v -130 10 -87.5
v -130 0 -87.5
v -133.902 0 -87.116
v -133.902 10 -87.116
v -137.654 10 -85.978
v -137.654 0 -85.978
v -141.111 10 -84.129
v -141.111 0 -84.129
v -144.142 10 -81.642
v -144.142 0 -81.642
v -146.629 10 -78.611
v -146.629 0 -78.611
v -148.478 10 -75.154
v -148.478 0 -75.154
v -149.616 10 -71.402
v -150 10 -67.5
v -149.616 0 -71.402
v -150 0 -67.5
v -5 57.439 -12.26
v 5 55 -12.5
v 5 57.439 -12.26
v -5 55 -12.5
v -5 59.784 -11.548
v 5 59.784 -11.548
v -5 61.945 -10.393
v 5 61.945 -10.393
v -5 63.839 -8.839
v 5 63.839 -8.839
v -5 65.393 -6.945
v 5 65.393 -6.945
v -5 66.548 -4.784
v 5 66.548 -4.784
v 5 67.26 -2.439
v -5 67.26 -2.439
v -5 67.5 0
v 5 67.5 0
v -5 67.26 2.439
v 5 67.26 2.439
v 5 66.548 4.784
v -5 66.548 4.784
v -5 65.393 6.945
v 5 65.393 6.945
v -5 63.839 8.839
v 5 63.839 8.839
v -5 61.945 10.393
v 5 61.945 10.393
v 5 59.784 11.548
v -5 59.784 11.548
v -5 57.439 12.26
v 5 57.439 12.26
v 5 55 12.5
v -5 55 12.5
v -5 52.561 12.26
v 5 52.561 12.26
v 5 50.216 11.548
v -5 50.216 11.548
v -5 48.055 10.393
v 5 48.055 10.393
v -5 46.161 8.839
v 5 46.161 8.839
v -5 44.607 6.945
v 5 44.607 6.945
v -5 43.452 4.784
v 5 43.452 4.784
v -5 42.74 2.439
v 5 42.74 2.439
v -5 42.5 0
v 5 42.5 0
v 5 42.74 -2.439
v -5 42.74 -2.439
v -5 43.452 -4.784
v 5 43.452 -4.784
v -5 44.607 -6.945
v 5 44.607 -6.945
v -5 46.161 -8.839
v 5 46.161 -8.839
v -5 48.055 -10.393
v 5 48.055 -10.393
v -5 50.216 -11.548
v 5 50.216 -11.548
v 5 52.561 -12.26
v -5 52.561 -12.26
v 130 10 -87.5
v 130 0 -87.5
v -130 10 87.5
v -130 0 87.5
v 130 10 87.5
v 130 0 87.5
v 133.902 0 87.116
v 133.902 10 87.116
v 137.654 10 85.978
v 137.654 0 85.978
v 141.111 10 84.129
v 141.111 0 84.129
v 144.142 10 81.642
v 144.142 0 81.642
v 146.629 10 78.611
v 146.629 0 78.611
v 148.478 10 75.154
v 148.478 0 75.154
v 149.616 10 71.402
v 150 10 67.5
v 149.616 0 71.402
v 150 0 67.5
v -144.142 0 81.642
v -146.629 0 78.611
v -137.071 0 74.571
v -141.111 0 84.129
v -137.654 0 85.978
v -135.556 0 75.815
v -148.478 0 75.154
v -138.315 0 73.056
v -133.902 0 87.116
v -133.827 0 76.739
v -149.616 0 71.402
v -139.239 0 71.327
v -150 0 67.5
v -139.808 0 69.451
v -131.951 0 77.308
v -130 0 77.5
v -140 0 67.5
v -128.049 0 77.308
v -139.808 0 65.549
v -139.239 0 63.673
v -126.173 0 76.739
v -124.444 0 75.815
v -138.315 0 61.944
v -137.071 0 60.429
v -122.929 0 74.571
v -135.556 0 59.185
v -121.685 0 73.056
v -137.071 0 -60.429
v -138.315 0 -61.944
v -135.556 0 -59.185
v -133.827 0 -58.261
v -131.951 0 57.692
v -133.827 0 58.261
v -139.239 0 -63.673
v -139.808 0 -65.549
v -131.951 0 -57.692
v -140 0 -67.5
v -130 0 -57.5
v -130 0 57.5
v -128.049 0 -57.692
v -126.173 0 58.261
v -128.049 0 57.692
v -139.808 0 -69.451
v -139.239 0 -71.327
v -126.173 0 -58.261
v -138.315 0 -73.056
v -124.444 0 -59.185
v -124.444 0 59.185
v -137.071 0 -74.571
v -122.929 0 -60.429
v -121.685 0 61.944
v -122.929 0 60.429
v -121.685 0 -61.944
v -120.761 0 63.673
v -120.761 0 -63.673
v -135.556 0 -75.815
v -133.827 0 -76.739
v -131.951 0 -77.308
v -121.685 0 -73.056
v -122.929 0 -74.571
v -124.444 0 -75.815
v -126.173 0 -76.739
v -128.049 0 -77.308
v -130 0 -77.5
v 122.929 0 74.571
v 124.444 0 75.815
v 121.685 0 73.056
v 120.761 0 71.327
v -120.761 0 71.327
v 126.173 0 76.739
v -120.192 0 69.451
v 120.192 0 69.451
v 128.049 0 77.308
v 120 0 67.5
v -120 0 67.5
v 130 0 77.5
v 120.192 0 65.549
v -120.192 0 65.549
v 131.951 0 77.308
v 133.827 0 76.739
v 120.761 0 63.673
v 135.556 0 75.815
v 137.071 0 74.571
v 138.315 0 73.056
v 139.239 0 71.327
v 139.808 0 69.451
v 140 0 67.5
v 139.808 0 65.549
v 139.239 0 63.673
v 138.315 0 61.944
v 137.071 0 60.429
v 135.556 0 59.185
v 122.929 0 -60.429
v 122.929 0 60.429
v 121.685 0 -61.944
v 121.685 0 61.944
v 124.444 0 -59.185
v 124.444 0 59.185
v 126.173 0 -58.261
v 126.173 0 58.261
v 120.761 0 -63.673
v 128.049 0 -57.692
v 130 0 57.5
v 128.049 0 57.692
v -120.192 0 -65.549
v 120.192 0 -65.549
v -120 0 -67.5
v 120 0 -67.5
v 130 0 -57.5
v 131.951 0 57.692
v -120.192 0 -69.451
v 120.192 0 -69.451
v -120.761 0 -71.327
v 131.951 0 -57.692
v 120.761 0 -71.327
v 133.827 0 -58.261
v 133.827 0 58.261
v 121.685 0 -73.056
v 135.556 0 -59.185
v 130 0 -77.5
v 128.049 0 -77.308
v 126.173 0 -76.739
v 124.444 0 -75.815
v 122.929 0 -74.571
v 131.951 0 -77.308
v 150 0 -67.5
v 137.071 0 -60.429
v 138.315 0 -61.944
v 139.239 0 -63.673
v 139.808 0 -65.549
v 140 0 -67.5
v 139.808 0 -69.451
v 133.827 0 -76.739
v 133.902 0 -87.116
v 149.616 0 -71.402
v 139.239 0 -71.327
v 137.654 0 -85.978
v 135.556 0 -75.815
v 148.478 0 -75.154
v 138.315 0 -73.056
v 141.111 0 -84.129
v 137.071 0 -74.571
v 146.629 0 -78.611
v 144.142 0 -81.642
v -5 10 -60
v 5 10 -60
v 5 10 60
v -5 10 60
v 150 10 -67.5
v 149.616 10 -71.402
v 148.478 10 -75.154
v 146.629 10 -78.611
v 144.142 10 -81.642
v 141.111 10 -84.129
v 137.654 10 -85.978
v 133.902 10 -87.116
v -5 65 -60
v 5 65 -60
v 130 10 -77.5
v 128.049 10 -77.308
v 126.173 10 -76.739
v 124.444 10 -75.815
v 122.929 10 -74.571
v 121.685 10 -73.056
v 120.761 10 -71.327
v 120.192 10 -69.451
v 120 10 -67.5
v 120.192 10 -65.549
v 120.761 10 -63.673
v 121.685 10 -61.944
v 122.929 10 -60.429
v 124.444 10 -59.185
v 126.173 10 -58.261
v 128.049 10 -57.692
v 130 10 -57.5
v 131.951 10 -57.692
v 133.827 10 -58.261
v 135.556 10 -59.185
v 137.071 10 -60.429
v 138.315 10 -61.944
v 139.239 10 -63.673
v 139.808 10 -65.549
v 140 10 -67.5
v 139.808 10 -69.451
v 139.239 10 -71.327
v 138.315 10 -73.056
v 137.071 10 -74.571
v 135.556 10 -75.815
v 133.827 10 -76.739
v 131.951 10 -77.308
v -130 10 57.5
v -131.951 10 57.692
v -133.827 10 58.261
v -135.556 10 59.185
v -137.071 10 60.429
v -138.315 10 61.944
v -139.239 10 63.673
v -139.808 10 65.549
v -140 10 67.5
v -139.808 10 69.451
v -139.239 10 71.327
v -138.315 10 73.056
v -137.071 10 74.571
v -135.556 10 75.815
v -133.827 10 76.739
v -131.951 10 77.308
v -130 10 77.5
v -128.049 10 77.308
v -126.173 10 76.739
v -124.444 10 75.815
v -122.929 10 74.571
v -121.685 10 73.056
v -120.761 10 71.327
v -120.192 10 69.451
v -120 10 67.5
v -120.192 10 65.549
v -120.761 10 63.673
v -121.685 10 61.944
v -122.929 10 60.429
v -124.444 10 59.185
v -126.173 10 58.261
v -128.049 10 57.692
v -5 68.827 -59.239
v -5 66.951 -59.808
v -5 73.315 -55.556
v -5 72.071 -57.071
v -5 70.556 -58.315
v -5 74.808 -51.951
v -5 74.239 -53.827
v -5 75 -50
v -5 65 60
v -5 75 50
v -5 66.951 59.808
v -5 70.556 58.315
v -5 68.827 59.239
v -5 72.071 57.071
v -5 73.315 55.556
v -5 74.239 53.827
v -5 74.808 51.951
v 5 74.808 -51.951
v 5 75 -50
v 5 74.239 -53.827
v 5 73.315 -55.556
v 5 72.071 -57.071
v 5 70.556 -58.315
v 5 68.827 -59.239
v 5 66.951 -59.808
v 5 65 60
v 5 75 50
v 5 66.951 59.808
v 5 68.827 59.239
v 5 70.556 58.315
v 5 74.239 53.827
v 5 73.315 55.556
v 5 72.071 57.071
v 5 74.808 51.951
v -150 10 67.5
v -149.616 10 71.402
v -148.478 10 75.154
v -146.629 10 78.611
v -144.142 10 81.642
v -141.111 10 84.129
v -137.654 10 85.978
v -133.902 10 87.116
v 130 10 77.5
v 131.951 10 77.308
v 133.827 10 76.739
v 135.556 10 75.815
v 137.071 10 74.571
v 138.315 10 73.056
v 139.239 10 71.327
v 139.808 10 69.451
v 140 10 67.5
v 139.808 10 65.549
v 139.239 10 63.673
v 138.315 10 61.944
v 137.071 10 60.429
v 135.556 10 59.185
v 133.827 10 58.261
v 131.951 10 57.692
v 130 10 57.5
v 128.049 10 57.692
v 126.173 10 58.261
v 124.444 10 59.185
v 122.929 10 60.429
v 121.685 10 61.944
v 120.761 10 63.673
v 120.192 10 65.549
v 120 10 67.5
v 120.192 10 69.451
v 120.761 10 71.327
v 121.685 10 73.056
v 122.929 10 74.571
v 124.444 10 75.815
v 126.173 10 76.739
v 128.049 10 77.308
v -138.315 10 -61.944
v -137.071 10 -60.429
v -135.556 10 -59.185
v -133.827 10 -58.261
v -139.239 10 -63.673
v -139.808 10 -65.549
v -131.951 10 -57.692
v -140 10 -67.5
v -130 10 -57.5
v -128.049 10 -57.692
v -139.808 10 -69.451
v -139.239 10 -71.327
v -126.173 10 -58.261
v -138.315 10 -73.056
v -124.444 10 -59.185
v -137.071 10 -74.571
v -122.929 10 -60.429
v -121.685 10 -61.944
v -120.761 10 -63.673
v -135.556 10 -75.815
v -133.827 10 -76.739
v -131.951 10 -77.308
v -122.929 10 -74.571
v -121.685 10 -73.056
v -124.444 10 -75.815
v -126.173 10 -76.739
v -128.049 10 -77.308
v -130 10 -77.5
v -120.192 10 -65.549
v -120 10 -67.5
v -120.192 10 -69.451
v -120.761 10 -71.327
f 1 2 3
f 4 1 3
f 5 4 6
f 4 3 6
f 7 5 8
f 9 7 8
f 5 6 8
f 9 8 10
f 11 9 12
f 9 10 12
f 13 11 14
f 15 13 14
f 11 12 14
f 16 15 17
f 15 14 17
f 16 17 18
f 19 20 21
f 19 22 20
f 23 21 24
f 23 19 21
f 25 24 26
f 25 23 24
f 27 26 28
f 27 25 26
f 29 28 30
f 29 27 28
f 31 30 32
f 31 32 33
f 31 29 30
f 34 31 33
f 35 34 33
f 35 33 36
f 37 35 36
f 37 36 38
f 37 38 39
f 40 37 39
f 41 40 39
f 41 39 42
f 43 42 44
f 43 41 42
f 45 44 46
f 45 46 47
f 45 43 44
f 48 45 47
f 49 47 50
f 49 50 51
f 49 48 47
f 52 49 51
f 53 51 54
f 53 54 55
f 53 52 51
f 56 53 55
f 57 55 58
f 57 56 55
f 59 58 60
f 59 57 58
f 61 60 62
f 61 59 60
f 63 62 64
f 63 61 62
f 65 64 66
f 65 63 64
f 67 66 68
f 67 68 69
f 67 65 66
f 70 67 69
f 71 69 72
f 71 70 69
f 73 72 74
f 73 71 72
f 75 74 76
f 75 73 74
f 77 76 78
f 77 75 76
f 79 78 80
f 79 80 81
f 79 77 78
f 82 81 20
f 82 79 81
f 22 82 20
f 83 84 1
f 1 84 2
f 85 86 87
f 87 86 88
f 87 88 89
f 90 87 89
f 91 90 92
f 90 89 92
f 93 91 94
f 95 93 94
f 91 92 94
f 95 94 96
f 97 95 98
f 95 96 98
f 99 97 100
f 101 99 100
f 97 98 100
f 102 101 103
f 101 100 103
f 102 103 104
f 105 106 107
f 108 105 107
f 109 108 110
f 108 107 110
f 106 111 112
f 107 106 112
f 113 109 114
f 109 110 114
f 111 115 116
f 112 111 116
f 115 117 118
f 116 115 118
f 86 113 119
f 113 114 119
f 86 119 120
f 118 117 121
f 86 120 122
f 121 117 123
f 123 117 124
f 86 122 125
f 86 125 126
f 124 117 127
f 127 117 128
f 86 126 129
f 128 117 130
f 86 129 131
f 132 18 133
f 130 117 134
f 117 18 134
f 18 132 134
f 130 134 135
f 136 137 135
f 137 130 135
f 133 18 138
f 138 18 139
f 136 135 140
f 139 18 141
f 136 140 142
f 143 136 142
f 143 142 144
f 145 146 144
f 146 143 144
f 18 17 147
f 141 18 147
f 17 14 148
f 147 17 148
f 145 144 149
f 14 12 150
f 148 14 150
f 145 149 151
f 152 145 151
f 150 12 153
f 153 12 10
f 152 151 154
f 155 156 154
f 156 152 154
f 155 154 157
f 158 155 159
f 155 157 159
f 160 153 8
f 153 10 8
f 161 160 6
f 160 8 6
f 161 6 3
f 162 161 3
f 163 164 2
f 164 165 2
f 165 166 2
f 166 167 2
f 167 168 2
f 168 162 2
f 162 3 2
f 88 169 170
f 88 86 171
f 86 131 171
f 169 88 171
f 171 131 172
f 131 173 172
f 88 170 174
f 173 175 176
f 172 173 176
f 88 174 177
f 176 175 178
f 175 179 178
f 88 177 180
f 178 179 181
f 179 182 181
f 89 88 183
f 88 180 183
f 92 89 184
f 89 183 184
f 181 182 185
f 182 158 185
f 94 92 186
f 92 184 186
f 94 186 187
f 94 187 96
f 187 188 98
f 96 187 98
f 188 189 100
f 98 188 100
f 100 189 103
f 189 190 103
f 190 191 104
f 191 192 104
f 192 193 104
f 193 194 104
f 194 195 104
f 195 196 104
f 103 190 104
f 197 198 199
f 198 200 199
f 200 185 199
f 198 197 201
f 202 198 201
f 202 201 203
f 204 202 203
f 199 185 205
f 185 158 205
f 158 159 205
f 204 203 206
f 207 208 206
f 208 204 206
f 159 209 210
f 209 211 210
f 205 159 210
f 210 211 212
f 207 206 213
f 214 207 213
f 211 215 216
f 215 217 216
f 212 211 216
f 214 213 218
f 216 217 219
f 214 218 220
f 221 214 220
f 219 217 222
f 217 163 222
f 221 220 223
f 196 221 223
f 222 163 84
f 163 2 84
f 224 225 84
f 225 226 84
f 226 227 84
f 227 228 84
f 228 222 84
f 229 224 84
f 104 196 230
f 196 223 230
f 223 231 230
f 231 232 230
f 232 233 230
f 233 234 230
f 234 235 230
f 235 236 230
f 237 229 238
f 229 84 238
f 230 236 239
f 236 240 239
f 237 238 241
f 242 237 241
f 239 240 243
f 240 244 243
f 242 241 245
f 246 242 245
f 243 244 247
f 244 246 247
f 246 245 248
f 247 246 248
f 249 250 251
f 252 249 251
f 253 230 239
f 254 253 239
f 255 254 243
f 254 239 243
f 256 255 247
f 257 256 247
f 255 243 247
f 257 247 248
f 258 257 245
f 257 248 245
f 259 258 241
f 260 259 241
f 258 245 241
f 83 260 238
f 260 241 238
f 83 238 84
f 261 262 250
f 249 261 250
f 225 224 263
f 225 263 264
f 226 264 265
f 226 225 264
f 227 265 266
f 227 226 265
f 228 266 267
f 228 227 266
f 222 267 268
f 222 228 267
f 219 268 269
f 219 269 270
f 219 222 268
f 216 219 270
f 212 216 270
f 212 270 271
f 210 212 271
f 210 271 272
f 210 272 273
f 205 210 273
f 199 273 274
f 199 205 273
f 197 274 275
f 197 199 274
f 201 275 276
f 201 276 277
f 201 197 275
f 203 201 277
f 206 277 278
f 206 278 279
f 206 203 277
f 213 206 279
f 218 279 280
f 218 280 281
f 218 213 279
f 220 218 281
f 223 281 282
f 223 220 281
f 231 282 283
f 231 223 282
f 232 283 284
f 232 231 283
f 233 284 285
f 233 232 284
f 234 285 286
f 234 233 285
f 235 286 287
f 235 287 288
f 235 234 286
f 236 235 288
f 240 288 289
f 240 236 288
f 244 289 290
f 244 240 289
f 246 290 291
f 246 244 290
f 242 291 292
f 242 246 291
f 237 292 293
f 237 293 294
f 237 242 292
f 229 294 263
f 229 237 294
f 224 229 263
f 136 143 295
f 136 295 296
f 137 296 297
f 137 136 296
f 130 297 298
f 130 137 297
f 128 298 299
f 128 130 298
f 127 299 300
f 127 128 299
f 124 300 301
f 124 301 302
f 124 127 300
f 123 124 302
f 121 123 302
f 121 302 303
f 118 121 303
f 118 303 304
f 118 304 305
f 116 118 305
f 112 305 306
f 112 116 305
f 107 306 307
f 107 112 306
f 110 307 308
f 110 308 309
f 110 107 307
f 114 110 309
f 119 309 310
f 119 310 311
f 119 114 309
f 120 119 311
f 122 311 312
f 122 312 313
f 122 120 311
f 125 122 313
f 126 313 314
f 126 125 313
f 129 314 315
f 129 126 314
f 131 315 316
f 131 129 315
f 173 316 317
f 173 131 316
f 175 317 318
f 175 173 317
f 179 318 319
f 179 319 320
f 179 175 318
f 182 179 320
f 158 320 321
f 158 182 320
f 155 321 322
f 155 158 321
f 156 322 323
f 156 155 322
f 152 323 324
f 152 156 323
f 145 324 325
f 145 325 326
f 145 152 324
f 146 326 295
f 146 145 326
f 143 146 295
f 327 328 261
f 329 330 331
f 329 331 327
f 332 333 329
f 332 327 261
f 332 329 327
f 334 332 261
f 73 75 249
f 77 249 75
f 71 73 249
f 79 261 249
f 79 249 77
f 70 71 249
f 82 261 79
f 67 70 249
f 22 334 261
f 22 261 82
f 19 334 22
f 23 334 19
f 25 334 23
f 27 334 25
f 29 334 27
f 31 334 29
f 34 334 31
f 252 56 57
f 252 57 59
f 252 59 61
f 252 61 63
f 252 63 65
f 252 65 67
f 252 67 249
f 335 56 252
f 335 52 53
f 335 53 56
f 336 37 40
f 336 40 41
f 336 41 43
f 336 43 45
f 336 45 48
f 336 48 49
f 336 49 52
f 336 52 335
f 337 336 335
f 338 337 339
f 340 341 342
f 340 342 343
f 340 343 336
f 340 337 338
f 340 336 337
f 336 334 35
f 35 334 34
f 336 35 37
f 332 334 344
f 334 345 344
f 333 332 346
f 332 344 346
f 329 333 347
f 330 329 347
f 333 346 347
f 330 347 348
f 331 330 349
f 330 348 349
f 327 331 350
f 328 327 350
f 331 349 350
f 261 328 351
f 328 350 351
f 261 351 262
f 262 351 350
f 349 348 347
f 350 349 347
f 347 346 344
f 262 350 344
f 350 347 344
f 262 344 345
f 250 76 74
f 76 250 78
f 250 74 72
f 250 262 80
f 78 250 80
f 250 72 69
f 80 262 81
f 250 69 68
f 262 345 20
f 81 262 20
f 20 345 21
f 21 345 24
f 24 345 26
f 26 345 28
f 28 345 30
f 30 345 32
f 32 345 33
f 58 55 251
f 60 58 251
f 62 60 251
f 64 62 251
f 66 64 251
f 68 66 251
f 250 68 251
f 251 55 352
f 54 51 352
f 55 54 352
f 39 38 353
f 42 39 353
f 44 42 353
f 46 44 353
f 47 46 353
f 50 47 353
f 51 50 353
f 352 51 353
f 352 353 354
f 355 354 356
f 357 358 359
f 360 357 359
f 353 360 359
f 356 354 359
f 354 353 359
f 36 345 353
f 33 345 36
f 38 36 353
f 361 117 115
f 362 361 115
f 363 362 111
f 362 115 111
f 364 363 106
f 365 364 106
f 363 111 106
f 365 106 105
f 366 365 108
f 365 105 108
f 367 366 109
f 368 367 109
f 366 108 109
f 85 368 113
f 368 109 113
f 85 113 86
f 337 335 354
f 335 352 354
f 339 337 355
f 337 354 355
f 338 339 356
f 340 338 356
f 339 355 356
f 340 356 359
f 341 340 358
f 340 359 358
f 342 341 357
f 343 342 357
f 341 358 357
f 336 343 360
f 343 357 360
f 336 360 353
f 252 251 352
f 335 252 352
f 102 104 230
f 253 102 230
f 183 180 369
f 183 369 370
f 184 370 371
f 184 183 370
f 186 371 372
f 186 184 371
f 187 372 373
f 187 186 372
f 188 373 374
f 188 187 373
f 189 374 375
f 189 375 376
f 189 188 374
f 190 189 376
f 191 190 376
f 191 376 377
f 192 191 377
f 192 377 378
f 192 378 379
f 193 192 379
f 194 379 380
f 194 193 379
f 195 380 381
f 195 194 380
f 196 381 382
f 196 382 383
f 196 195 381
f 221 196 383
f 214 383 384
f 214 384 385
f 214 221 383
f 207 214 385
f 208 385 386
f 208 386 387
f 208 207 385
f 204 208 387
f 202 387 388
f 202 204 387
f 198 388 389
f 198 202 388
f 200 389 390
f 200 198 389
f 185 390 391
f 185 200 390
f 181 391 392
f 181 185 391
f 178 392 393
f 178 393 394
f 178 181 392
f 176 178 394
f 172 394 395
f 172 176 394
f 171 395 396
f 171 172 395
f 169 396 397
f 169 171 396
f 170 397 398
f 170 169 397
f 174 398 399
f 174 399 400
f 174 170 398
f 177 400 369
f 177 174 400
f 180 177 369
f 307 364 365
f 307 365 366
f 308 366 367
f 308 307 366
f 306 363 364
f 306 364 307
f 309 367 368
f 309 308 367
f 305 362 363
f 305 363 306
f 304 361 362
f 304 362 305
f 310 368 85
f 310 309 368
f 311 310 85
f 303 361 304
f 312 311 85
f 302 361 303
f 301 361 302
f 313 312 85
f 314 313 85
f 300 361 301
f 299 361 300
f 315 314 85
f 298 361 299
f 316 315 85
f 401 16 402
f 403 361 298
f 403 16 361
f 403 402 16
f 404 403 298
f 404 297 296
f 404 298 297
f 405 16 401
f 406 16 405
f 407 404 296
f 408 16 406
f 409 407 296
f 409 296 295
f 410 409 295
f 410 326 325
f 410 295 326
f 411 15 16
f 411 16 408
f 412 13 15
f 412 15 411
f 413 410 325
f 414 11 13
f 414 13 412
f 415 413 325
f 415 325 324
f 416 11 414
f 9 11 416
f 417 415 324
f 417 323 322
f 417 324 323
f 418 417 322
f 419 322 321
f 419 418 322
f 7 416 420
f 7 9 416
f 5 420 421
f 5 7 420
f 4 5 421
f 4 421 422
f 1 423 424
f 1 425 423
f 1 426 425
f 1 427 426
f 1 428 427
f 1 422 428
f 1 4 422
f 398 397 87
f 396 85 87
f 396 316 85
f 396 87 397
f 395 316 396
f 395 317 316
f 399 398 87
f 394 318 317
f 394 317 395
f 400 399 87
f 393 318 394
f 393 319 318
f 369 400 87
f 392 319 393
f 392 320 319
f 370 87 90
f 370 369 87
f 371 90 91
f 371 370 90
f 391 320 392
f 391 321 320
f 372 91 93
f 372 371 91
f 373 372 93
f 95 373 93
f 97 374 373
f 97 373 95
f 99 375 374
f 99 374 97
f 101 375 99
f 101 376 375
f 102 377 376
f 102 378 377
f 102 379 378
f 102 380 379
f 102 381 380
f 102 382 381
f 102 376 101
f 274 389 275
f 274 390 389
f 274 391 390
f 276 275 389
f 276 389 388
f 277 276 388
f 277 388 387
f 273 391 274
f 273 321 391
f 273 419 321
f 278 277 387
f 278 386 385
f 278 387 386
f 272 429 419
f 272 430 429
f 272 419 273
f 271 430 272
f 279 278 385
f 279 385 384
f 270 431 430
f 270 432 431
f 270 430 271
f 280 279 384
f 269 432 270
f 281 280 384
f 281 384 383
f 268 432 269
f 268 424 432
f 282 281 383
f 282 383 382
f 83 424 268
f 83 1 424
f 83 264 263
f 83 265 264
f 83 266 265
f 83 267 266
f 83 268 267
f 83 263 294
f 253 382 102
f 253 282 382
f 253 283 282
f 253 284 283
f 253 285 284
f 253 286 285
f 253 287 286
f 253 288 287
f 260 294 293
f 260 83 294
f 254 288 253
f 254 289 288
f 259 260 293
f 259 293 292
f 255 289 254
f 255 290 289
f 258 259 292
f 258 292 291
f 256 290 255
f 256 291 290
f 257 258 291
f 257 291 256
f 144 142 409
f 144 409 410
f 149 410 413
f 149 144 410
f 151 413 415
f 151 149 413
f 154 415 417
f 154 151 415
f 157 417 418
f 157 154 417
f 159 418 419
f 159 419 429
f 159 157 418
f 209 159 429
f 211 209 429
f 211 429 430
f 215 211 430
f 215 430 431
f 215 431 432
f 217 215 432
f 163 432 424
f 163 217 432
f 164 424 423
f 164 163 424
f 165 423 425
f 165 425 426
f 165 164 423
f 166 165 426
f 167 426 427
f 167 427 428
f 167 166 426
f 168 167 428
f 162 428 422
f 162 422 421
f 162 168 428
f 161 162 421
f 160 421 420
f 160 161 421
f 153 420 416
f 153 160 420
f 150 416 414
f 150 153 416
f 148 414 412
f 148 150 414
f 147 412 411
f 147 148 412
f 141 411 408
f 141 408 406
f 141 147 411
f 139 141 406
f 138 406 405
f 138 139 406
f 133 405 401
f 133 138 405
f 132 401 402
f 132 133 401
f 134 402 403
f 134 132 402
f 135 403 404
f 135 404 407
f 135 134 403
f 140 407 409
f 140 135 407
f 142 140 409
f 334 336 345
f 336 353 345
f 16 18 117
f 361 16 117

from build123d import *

# Parameters (mm, degrees)
SKETCH4_R           = 10
BOSS_EXTRUDE2_DEPTH = 10
SKETCH5_R           = 12.5
BOSS_EXTRUDE3_DEPTH = 5


with BuildPart() as part:
    # Sketch4 → Boss-Extrude2 (new body)
    with BuildSketch(Plane(origin=(0, 0, 0), x_dir=(1, 0, 0), z_dir=(0, 1, 0))):
        with BuildLine():
            Line((-130, -87.5), (130, -87.5))
            ThreePointArc((130, -87.5), (144.142135624, -81.642135624), (150, -67.5))
            Line((150, -67.5), (150, 67.5))
            ThreePointArc((150, 67.5), (144.142135624, 81.642135624), (130, 87.5))
            Line((130, 87.5), (-130, 87.5))
            ThreePointArc((-130, 87.5), (-144.142135624, 81.642135624), (-150, 67.5))
            Line((-150, 67.5), (-150, -67.5))
            ThreePointArc((-150, -67.5), (-144.142135624, -81.642135624), (-130, -87.5))
        make_face()
        with Locations(Location((-130, 67.5, 0), (0, 0, 270))):
            Circle(SKETCH4_R, mode=Mode.SUBTRACT)
        with Locations(Location((-130, -67.5, 0), (0, 0, 90))):
            Circle(SKETCH4_R, mode=Mode.SUBTRACT)
        with Locations(Location((130, 67.5, 0), (0, 0, 90))):
            Circle(SKETCH4_R, mode=Mode.SUBTRACT)
        with Locations(Location((130, -67.5, 0), (0, 0, 270))):
            Circle(SKETCH4_R, mode=Mode.SUBTRACT)
    extrude(amount=BOSS_EXTRUDE2_DEPTH)


with BuildPart() as body_2:
    # Sketch5 → Boss-Extrude3 (new, symmetric)
    with BuildSketch(Plane(origin=(0, 0, 0), x_dir=(0, 0, -1), z_dir=(1, 0, 0))):
        with BuildLine():
            Line((-60, 10), (-60, 65))
            ThreePointArc((-60, 65), (-57.071067812, 72.071067812), (-50, 75))
            Line((-50, 75), (50, 75))
            ThreePointArc((50, 75), (57.071067812, 72.071067812), (60, 65))
            Line((60, 65), (60, 10))
            Line((60, 10), (-60, 10))
        make_face()
        with Locations((0, 55)):
            Circle(SKETCH5_R, mode=Mode.SUBTRACT)
    extrude(amount=BOSS_EXTRUDE3_DEPTH, both=True)


solid = Compound([part.part, body_2.part])
